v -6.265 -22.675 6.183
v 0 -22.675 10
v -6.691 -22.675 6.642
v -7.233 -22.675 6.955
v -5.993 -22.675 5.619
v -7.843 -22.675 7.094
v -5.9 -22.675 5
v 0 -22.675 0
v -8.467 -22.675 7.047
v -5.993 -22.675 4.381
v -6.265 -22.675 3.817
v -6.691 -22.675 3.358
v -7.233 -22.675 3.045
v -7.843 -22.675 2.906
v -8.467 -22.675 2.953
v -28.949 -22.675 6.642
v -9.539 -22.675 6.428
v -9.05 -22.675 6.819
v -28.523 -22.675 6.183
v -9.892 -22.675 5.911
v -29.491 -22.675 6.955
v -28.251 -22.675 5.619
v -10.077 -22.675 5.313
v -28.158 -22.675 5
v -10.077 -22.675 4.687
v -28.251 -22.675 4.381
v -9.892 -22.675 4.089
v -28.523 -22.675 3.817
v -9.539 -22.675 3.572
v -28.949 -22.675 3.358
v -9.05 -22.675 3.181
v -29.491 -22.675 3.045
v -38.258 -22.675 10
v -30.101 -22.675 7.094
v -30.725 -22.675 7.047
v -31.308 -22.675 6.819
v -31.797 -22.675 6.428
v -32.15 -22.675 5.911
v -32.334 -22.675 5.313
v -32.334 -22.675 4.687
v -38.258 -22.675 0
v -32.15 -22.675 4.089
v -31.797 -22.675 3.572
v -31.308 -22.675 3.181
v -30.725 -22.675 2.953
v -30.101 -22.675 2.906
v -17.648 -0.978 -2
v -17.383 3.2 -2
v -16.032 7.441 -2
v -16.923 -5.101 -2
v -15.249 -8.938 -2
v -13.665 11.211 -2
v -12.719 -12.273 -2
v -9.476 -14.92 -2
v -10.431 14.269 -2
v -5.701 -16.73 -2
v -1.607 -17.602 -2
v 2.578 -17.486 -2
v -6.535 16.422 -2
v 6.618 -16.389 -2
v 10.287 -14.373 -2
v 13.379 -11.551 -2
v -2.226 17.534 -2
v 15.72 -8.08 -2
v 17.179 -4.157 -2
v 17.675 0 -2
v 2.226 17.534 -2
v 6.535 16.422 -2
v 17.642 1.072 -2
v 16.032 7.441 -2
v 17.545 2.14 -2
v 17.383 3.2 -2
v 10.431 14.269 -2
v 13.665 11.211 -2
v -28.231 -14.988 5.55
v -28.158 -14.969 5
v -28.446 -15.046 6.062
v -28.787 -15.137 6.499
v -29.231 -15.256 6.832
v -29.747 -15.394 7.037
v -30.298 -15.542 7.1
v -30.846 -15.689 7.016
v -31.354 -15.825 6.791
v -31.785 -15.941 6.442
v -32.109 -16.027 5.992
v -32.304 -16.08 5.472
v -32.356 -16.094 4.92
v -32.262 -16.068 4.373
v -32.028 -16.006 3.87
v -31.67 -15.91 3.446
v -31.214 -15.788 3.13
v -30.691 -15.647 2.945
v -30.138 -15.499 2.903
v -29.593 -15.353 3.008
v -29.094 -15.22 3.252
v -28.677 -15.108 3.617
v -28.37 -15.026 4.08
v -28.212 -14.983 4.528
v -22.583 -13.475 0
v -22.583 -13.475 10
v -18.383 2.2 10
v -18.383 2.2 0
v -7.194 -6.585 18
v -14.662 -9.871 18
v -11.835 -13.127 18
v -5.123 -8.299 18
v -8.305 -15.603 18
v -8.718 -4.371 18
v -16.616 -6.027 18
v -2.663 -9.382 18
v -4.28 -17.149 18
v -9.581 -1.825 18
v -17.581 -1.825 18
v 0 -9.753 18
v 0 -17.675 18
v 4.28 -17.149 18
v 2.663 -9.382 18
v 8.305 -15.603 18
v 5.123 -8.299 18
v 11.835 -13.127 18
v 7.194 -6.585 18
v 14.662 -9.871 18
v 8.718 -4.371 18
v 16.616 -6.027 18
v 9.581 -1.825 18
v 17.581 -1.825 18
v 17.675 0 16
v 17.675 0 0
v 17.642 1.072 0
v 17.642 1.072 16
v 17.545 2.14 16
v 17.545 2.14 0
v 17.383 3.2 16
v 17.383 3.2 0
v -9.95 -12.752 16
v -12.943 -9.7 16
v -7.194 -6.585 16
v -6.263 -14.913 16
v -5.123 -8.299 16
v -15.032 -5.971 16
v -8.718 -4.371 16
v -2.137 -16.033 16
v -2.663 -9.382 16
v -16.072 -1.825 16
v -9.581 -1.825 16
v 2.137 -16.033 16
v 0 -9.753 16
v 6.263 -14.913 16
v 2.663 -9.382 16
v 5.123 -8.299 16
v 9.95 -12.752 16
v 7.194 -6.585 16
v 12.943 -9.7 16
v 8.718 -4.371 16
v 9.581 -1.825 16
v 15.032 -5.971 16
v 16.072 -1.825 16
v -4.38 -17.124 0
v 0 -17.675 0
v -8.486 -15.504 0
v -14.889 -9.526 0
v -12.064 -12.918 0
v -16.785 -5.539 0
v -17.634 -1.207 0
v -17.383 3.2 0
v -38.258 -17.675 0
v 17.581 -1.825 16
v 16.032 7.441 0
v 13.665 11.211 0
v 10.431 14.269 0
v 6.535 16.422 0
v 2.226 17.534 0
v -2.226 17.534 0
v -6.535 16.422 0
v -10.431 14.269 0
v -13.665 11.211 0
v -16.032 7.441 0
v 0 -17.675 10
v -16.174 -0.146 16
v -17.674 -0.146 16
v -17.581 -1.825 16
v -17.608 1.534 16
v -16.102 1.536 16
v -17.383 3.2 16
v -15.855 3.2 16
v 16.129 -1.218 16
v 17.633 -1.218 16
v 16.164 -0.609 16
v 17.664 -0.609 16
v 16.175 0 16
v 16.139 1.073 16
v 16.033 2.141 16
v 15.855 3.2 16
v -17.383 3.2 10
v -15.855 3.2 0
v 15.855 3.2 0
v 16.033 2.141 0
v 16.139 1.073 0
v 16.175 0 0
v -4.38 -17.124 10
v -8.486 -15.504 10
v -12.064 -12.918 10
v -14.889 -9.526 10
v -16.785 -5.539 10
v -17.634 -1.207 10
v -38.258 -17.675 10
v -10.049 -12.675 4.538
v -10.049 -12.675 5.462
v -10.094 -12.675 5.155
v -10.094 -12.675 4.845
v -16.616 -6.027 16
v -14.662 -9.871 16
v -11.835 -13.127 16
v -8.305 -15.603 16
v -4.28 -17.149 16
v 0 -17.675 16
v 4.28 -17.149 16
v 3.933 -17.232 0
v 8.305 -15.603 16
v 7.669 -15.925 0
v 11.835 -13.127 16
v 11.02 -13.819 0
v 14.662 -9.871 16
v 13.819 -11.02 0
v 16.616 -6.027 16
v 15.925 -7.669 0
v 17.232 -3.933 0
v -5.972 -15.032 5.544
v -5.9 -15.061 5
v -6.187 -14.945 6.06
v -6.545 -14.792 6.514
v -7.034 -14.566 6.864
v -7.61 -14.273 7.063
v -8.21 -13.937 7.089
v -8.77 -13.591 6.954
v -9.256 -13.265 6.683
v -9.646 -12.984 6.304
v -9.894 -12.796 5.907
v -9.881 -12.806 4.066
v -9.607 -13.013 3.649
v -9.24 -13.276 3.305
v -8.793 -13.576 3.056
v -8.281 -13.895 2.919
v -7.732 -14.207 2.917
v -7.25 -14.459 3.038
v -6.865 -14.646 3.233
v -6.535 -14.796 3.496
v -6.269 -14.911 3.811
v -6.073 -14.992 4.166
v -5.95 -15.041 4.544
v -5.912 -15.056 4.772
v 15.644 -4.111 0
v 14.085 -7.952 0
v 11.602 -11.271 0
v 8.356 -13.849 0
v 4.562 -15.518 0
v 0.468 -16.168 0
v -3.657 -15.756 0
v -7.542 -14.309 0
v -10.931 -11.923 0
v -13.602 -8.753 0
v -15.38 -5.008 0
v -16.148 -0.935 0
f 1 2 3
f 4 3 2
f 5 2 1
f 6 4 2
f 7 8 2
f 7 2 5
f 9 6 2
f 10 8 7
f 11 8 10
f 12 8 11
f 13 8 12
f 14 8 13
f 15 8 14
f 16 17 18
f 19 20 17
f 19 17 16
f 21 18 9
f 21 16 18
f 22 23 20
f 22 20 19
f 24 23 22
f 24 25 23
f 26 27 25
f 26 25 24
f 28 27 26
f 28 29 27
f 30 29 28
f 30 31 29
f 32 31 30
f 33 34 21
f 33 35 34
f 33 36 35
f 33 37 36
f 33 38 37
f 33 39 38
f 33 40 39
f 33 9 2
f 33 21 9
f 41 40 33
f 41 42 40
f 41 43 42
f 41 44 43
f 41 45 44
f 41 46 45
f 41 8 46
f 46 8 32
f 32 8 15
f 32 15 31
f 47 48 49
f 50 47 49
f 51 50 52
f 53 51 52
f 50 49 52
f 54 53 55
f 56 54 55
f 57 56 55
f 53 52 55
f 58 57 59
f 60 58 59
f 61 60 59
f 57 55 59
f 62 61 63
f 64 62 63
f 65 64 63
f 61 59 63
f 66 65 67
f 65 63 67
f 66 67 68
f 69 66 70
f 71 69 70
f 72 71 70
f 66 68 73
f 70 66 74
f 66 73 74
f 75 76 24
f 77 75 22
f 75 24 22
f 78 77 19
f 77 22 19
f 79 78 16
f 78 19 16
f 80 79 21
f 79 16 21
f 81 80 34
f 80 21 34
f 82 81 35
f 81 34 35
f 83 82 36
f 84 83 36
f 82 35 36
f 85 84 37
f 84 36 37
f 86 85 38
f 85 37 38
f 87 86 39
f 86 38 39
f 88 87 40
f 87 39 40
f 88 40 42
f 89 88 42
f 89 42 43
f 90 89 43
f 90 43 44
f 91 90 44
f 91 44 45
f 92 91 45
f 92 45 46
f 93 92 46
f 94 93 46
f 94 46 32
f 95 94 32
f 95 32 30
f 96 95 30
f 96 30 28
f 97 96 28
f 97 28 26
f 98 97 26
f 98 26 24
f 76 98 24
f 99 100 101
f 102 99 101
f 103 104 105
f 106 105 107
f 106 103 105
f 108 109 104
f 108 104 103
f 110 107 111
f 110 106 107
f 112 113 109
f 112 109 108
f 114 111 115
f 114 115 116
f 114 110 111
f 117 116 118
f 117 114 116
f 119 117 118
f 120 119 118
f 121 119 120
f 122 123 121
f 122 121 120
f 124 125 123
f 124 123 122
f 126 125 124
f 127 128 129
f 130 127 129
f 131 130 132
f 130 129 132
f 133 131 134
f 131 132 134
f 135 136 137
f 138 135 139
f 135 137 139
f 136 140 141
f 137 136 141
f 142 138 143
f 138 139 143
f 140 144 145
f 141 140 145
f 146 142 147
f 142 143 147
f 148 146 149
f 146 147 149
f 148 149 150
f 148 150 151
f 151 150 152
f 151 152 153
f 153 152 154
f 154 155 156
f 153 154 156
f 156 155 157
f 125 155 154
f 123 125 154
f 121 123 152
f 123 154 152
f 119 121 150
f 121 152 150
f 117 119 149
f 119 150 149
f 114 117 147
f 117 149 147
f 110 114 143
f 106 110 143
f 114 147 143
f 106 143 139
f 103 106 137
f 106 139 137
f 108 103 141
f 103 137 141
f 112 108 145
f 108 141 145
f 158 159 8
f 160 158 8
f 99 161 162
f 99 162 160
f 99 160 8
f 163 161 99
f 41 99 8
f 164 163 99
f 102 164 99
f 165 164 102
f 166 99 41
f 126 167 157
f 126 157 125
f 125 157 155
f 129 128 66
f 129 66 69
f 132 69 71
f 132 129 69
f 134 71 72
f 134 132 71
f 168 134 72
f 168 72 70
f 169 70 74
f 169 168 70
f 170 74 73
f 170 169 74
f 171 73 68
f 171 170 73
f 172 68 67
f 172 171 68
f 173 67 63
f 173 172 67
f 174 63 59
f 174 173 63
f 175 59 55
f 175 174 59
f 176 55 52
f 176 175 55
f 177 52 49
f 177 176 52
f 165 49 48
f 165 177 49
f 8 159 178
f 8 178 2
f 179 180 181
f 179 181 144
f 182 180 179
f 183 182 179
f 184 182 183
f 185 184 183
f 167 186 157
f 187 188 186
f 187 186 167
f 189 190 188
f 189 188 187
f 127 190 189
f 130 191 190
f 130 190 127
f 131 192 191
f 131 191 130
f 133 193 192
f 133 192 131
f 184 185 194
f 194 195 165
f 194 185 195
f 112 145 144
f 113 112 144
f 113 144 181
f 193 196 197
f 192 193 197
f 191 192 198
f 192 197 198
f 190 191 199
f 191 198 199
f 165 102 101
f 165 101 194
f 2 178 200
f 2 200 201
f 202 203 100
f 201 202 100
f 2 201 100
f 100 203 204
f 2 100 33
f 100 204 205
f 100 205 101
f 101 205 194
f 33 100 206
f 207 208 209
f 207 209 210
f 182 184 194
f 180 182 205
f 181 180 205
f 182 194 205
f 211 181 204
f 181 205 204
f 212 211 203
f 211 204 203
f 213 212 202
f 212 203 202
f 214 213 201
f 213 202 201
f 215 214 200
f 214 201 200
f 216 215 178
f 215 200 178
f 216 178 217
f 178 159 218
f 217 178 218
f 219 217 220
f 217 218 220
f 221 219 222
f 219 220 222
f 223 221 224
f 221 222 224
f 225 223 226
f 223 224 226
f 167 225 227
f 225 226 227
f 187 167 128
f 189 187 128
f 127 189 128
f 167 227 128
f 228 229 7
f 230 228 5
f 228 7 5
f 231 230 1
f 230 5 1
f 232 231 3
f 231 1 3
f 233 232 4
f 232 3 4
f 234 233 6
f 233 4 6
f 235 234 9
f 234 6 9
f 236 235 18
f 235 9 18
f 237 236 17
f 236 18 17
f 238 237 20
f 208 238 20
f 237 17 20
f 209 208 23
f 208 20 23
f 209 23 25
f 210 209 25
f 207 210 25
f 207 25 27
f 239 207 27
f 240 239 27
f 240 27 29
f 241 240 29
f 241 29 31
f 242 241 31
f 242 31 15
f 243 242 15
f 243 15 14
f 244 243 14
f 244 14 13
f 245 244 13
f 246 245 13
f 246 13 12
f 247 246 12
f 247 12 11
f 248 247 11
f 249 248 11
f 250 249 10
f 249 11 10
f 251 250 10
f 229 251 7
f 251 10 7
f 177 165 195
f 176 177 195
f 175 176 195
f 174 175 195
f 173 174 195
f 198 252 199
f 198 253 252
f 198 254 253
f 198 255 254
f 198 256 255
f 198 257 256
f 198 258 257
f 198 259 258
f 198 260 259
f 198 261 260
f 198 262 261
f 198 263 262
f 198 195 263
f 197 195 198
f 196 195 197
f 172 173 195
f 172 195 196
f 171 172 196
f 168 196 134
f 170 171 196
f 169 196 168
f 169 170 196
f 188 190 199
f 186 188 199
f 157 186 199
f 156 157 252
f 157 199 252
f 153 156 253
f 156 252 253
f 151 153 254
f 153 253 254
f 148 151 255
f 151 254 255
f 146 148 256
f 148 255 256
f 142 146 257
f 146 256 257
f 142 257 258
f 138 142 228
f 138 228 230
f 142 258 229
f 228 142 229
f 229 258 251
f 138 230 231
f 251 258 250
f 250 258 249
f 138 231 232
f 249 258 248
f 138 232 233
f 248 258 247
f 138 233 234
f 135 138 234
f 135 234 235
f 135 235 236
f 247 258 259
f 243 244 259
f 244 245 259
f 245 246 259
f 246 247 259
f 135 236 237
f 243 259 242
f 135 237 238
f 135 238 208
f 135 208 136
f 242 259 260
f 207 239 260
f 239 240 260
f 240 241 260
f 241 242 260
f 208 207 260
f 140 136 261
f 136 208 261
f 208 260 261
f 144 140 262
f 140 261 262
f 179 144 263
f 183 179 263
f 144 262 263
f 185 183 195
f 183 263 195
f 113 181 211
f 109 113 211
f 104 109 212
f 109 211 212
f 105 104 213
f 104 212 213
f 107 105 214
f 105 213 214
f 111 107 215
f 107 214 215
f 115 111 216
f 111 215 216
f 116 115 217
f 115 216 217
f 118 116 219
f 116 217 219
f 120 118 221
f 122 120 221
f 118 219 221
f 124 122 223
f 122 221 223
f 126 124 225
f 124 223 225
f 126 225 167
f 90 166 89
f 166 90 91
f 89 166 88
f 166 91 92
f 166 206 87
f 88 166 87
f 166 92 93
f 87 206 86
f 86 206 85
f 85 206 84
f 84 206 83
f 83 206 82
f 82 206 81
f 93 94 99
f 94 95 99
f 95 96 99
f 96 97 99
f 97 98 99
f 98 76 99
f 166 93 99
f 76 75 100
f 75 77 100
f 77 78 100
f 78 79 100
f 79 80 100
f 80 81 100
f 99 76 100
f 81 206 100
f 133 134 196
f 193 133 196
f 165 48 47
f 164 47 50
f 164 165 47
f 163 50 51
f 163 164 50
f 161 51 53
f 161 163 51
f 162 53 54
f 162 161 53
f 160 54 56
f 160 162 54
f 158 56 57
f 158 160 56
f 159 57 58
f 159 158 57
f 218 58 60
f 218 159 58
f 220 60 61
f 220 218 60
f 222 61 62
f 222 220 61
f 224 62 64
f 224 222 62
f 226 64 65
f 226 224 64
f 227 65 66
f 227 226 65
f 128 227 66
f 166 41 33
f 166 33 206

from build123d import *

# Parameters (mm, degrees)
SKETCH1_R               = 16.175
BOSS_EXTRUDE1_DEPTH     = 2
BOSS_EXTRUDE2_DEPTH     = 16
BOSS_EXTRUDE3_DEPTH     = 2
BOSS_EXTRUDE4_DEPTH     = 10
SKETCH5_R               = 2.1
CUT_EXTRUDE3_DEPTH      = 10
CUT_EXTRUDE5_DEPTH      = 9
CUT_EXTRUDE5_DEPTH_BACK = 13


with BuildPart() as part:
    # Sketch1 → Boss-Extrude1 (new body)
    with BuildSketch(Plane.XY):
        Circle(SKETCH1_R)
        with BuildLine():
            ThreePointArc((17.382911868, 3.2), (0, 17.675), (-17.382911868, 3.2))
            Line((-17.382911868, 3.2), (-15.855302741, 3.2))
            ThreePointArc((-15.855302741, 3.2), (0, 16.175), (15.855302741, 3.2))
            Line((15.855302741, 3.2), (17.382911868, 3.2))
        make_face()
        with BuildLine():
            Line((-15.855302741, 3.2), (-17.382911868, 3.2))
            ThreePointArc((-17.382911868, 3.2), (-1.606651446, -17.6018265), (17.675, 0))
            ThreePointArc((17.675, 0), (17.6018265, 1.606651446), (17.382911868, 3.2))
            Line((17.382911868, 3.2), (15.855302741, 3.2))
            ThreePointArc((15.855302741, 3.2), (16.094877241, 1.607965045), (16.175, 0))
            ThreePointArc((16.175, 0), (-1.607965045, -16.094877241), (-15.855302741, 3.2))
        make_face()
    extrude(amount=-BOSS_EXTRUDE1_DEPTH)

    # Sketch1<4> → Boss-Extrude2 (add)
    with BuildSketch(Plane.XY):
        with BuildLine():
            Line((-15.855302741, 3.2), (-17.382911868, 3.2))
            ThreePointArc((-17.382911868, 3.2), (-1.606651446, -17.6018265), (17.675, 0))
            ThreePointArc((17.675, 0), (17.6018265, 1.606651446), (17.382911868, 3.2))
            Line((17.382911868, 3.2), (15.855302741, 3.2))
            ThreePointArc((15.855302741, 3.2), (16.094877241, 1.607965045), (16.175, 0))
            ThreePointArc((16.175, 0), (-1.607965045, -16.094877241), (-15.855302741, 3.2))
        make_face()
    extrude(amount=BOSS_EXTRUDE2_DEPTH)

    # Sketch2 → Boss-Extrude3 (add)
    with BuildSketch(Plane.XY.offset(16)):
        with BuildLine():
            Line((-9.580529002, -1.825), (-16.071714283, -1.825))
            ThreePointArc((-16.071714283, -1.825), (0, -16.175), (16.071714283, -1.825))
            Line((16.071714283, -1.825), (9.580529002, -1.825))
            ThreePointArc((9.580529002, -1.825), (0, -9.752802724), (-9.580529002, -1.825))
        make_face()
        with BuildLine():
            Line((-16.071714283, -1.825), (-17.580529002, -1.825))
            ThreePointArc((-17.580529002, -1.825), (0, -17.675), (17.580529002, -1.825))
            Line((17.580529002, -1.825), (16.071714283, -1.825))
            ThreePointArc((16.071714283, -1.825), (0, -16.175), (-16.071714283, -1.825))
        make_face()
    extrude(amount=BOSS_EXTRUDE3_DEPTH)

    # Sketch3 → Boss-Extrude4 (add)
    with BuildSketch(Plane.XY):
        with BuildLine():
            Line((-38.257911868, -17.675), (-17.382911868, 3.2))
            ThreePointArc((-17.382911868, 3.2), (-13.582445012, -11.310296747), (0, -17.675))
            Line((0, -17.675), (0, -22.675))
            Line((0, -22.675), (-38.257911868, -22.675))
            Line((-38.257911868, -22.675), (-38.257911868, -17.675))
        make_face()
    extrude(amount=BOSS_EXTRUDE4_DEPTH)

    # Sketch5 → Cut-Extrude3 (cut)
    with BuildSketch(Plane.XZ.offset(22.675)):
        with Locations((-30.257911868, 5)):
            Circle(SKETCH5_R)
        with Locations((-8, 5)):
            Circle(SKETCH5_R)
    extrude(amount=-CUT_EXTRUDE3_DEPTH, mode=Mode.SUBTRACT)

    # Sketch6 → Cut-Extrude5 (cut, two sides)
    with BuildSketch(Plane.XY.offset(10)) as cut_extrude5_sk:
        Polygon((-38.257911868, -17.675), (-22.582993568, -13.4749183), (-18.382911868, 2.2), align=None)
    extrude(amount=CUT_EXTRUDE5_DEPTH, mode=Mode.SUBTRACT)
    extrude(cut_extrude5_sk.sketch, amount=-CUT_EXTRUDE5_DEPTH_BACK, mode=Mode.SUBTRACT)


solid = part.part
